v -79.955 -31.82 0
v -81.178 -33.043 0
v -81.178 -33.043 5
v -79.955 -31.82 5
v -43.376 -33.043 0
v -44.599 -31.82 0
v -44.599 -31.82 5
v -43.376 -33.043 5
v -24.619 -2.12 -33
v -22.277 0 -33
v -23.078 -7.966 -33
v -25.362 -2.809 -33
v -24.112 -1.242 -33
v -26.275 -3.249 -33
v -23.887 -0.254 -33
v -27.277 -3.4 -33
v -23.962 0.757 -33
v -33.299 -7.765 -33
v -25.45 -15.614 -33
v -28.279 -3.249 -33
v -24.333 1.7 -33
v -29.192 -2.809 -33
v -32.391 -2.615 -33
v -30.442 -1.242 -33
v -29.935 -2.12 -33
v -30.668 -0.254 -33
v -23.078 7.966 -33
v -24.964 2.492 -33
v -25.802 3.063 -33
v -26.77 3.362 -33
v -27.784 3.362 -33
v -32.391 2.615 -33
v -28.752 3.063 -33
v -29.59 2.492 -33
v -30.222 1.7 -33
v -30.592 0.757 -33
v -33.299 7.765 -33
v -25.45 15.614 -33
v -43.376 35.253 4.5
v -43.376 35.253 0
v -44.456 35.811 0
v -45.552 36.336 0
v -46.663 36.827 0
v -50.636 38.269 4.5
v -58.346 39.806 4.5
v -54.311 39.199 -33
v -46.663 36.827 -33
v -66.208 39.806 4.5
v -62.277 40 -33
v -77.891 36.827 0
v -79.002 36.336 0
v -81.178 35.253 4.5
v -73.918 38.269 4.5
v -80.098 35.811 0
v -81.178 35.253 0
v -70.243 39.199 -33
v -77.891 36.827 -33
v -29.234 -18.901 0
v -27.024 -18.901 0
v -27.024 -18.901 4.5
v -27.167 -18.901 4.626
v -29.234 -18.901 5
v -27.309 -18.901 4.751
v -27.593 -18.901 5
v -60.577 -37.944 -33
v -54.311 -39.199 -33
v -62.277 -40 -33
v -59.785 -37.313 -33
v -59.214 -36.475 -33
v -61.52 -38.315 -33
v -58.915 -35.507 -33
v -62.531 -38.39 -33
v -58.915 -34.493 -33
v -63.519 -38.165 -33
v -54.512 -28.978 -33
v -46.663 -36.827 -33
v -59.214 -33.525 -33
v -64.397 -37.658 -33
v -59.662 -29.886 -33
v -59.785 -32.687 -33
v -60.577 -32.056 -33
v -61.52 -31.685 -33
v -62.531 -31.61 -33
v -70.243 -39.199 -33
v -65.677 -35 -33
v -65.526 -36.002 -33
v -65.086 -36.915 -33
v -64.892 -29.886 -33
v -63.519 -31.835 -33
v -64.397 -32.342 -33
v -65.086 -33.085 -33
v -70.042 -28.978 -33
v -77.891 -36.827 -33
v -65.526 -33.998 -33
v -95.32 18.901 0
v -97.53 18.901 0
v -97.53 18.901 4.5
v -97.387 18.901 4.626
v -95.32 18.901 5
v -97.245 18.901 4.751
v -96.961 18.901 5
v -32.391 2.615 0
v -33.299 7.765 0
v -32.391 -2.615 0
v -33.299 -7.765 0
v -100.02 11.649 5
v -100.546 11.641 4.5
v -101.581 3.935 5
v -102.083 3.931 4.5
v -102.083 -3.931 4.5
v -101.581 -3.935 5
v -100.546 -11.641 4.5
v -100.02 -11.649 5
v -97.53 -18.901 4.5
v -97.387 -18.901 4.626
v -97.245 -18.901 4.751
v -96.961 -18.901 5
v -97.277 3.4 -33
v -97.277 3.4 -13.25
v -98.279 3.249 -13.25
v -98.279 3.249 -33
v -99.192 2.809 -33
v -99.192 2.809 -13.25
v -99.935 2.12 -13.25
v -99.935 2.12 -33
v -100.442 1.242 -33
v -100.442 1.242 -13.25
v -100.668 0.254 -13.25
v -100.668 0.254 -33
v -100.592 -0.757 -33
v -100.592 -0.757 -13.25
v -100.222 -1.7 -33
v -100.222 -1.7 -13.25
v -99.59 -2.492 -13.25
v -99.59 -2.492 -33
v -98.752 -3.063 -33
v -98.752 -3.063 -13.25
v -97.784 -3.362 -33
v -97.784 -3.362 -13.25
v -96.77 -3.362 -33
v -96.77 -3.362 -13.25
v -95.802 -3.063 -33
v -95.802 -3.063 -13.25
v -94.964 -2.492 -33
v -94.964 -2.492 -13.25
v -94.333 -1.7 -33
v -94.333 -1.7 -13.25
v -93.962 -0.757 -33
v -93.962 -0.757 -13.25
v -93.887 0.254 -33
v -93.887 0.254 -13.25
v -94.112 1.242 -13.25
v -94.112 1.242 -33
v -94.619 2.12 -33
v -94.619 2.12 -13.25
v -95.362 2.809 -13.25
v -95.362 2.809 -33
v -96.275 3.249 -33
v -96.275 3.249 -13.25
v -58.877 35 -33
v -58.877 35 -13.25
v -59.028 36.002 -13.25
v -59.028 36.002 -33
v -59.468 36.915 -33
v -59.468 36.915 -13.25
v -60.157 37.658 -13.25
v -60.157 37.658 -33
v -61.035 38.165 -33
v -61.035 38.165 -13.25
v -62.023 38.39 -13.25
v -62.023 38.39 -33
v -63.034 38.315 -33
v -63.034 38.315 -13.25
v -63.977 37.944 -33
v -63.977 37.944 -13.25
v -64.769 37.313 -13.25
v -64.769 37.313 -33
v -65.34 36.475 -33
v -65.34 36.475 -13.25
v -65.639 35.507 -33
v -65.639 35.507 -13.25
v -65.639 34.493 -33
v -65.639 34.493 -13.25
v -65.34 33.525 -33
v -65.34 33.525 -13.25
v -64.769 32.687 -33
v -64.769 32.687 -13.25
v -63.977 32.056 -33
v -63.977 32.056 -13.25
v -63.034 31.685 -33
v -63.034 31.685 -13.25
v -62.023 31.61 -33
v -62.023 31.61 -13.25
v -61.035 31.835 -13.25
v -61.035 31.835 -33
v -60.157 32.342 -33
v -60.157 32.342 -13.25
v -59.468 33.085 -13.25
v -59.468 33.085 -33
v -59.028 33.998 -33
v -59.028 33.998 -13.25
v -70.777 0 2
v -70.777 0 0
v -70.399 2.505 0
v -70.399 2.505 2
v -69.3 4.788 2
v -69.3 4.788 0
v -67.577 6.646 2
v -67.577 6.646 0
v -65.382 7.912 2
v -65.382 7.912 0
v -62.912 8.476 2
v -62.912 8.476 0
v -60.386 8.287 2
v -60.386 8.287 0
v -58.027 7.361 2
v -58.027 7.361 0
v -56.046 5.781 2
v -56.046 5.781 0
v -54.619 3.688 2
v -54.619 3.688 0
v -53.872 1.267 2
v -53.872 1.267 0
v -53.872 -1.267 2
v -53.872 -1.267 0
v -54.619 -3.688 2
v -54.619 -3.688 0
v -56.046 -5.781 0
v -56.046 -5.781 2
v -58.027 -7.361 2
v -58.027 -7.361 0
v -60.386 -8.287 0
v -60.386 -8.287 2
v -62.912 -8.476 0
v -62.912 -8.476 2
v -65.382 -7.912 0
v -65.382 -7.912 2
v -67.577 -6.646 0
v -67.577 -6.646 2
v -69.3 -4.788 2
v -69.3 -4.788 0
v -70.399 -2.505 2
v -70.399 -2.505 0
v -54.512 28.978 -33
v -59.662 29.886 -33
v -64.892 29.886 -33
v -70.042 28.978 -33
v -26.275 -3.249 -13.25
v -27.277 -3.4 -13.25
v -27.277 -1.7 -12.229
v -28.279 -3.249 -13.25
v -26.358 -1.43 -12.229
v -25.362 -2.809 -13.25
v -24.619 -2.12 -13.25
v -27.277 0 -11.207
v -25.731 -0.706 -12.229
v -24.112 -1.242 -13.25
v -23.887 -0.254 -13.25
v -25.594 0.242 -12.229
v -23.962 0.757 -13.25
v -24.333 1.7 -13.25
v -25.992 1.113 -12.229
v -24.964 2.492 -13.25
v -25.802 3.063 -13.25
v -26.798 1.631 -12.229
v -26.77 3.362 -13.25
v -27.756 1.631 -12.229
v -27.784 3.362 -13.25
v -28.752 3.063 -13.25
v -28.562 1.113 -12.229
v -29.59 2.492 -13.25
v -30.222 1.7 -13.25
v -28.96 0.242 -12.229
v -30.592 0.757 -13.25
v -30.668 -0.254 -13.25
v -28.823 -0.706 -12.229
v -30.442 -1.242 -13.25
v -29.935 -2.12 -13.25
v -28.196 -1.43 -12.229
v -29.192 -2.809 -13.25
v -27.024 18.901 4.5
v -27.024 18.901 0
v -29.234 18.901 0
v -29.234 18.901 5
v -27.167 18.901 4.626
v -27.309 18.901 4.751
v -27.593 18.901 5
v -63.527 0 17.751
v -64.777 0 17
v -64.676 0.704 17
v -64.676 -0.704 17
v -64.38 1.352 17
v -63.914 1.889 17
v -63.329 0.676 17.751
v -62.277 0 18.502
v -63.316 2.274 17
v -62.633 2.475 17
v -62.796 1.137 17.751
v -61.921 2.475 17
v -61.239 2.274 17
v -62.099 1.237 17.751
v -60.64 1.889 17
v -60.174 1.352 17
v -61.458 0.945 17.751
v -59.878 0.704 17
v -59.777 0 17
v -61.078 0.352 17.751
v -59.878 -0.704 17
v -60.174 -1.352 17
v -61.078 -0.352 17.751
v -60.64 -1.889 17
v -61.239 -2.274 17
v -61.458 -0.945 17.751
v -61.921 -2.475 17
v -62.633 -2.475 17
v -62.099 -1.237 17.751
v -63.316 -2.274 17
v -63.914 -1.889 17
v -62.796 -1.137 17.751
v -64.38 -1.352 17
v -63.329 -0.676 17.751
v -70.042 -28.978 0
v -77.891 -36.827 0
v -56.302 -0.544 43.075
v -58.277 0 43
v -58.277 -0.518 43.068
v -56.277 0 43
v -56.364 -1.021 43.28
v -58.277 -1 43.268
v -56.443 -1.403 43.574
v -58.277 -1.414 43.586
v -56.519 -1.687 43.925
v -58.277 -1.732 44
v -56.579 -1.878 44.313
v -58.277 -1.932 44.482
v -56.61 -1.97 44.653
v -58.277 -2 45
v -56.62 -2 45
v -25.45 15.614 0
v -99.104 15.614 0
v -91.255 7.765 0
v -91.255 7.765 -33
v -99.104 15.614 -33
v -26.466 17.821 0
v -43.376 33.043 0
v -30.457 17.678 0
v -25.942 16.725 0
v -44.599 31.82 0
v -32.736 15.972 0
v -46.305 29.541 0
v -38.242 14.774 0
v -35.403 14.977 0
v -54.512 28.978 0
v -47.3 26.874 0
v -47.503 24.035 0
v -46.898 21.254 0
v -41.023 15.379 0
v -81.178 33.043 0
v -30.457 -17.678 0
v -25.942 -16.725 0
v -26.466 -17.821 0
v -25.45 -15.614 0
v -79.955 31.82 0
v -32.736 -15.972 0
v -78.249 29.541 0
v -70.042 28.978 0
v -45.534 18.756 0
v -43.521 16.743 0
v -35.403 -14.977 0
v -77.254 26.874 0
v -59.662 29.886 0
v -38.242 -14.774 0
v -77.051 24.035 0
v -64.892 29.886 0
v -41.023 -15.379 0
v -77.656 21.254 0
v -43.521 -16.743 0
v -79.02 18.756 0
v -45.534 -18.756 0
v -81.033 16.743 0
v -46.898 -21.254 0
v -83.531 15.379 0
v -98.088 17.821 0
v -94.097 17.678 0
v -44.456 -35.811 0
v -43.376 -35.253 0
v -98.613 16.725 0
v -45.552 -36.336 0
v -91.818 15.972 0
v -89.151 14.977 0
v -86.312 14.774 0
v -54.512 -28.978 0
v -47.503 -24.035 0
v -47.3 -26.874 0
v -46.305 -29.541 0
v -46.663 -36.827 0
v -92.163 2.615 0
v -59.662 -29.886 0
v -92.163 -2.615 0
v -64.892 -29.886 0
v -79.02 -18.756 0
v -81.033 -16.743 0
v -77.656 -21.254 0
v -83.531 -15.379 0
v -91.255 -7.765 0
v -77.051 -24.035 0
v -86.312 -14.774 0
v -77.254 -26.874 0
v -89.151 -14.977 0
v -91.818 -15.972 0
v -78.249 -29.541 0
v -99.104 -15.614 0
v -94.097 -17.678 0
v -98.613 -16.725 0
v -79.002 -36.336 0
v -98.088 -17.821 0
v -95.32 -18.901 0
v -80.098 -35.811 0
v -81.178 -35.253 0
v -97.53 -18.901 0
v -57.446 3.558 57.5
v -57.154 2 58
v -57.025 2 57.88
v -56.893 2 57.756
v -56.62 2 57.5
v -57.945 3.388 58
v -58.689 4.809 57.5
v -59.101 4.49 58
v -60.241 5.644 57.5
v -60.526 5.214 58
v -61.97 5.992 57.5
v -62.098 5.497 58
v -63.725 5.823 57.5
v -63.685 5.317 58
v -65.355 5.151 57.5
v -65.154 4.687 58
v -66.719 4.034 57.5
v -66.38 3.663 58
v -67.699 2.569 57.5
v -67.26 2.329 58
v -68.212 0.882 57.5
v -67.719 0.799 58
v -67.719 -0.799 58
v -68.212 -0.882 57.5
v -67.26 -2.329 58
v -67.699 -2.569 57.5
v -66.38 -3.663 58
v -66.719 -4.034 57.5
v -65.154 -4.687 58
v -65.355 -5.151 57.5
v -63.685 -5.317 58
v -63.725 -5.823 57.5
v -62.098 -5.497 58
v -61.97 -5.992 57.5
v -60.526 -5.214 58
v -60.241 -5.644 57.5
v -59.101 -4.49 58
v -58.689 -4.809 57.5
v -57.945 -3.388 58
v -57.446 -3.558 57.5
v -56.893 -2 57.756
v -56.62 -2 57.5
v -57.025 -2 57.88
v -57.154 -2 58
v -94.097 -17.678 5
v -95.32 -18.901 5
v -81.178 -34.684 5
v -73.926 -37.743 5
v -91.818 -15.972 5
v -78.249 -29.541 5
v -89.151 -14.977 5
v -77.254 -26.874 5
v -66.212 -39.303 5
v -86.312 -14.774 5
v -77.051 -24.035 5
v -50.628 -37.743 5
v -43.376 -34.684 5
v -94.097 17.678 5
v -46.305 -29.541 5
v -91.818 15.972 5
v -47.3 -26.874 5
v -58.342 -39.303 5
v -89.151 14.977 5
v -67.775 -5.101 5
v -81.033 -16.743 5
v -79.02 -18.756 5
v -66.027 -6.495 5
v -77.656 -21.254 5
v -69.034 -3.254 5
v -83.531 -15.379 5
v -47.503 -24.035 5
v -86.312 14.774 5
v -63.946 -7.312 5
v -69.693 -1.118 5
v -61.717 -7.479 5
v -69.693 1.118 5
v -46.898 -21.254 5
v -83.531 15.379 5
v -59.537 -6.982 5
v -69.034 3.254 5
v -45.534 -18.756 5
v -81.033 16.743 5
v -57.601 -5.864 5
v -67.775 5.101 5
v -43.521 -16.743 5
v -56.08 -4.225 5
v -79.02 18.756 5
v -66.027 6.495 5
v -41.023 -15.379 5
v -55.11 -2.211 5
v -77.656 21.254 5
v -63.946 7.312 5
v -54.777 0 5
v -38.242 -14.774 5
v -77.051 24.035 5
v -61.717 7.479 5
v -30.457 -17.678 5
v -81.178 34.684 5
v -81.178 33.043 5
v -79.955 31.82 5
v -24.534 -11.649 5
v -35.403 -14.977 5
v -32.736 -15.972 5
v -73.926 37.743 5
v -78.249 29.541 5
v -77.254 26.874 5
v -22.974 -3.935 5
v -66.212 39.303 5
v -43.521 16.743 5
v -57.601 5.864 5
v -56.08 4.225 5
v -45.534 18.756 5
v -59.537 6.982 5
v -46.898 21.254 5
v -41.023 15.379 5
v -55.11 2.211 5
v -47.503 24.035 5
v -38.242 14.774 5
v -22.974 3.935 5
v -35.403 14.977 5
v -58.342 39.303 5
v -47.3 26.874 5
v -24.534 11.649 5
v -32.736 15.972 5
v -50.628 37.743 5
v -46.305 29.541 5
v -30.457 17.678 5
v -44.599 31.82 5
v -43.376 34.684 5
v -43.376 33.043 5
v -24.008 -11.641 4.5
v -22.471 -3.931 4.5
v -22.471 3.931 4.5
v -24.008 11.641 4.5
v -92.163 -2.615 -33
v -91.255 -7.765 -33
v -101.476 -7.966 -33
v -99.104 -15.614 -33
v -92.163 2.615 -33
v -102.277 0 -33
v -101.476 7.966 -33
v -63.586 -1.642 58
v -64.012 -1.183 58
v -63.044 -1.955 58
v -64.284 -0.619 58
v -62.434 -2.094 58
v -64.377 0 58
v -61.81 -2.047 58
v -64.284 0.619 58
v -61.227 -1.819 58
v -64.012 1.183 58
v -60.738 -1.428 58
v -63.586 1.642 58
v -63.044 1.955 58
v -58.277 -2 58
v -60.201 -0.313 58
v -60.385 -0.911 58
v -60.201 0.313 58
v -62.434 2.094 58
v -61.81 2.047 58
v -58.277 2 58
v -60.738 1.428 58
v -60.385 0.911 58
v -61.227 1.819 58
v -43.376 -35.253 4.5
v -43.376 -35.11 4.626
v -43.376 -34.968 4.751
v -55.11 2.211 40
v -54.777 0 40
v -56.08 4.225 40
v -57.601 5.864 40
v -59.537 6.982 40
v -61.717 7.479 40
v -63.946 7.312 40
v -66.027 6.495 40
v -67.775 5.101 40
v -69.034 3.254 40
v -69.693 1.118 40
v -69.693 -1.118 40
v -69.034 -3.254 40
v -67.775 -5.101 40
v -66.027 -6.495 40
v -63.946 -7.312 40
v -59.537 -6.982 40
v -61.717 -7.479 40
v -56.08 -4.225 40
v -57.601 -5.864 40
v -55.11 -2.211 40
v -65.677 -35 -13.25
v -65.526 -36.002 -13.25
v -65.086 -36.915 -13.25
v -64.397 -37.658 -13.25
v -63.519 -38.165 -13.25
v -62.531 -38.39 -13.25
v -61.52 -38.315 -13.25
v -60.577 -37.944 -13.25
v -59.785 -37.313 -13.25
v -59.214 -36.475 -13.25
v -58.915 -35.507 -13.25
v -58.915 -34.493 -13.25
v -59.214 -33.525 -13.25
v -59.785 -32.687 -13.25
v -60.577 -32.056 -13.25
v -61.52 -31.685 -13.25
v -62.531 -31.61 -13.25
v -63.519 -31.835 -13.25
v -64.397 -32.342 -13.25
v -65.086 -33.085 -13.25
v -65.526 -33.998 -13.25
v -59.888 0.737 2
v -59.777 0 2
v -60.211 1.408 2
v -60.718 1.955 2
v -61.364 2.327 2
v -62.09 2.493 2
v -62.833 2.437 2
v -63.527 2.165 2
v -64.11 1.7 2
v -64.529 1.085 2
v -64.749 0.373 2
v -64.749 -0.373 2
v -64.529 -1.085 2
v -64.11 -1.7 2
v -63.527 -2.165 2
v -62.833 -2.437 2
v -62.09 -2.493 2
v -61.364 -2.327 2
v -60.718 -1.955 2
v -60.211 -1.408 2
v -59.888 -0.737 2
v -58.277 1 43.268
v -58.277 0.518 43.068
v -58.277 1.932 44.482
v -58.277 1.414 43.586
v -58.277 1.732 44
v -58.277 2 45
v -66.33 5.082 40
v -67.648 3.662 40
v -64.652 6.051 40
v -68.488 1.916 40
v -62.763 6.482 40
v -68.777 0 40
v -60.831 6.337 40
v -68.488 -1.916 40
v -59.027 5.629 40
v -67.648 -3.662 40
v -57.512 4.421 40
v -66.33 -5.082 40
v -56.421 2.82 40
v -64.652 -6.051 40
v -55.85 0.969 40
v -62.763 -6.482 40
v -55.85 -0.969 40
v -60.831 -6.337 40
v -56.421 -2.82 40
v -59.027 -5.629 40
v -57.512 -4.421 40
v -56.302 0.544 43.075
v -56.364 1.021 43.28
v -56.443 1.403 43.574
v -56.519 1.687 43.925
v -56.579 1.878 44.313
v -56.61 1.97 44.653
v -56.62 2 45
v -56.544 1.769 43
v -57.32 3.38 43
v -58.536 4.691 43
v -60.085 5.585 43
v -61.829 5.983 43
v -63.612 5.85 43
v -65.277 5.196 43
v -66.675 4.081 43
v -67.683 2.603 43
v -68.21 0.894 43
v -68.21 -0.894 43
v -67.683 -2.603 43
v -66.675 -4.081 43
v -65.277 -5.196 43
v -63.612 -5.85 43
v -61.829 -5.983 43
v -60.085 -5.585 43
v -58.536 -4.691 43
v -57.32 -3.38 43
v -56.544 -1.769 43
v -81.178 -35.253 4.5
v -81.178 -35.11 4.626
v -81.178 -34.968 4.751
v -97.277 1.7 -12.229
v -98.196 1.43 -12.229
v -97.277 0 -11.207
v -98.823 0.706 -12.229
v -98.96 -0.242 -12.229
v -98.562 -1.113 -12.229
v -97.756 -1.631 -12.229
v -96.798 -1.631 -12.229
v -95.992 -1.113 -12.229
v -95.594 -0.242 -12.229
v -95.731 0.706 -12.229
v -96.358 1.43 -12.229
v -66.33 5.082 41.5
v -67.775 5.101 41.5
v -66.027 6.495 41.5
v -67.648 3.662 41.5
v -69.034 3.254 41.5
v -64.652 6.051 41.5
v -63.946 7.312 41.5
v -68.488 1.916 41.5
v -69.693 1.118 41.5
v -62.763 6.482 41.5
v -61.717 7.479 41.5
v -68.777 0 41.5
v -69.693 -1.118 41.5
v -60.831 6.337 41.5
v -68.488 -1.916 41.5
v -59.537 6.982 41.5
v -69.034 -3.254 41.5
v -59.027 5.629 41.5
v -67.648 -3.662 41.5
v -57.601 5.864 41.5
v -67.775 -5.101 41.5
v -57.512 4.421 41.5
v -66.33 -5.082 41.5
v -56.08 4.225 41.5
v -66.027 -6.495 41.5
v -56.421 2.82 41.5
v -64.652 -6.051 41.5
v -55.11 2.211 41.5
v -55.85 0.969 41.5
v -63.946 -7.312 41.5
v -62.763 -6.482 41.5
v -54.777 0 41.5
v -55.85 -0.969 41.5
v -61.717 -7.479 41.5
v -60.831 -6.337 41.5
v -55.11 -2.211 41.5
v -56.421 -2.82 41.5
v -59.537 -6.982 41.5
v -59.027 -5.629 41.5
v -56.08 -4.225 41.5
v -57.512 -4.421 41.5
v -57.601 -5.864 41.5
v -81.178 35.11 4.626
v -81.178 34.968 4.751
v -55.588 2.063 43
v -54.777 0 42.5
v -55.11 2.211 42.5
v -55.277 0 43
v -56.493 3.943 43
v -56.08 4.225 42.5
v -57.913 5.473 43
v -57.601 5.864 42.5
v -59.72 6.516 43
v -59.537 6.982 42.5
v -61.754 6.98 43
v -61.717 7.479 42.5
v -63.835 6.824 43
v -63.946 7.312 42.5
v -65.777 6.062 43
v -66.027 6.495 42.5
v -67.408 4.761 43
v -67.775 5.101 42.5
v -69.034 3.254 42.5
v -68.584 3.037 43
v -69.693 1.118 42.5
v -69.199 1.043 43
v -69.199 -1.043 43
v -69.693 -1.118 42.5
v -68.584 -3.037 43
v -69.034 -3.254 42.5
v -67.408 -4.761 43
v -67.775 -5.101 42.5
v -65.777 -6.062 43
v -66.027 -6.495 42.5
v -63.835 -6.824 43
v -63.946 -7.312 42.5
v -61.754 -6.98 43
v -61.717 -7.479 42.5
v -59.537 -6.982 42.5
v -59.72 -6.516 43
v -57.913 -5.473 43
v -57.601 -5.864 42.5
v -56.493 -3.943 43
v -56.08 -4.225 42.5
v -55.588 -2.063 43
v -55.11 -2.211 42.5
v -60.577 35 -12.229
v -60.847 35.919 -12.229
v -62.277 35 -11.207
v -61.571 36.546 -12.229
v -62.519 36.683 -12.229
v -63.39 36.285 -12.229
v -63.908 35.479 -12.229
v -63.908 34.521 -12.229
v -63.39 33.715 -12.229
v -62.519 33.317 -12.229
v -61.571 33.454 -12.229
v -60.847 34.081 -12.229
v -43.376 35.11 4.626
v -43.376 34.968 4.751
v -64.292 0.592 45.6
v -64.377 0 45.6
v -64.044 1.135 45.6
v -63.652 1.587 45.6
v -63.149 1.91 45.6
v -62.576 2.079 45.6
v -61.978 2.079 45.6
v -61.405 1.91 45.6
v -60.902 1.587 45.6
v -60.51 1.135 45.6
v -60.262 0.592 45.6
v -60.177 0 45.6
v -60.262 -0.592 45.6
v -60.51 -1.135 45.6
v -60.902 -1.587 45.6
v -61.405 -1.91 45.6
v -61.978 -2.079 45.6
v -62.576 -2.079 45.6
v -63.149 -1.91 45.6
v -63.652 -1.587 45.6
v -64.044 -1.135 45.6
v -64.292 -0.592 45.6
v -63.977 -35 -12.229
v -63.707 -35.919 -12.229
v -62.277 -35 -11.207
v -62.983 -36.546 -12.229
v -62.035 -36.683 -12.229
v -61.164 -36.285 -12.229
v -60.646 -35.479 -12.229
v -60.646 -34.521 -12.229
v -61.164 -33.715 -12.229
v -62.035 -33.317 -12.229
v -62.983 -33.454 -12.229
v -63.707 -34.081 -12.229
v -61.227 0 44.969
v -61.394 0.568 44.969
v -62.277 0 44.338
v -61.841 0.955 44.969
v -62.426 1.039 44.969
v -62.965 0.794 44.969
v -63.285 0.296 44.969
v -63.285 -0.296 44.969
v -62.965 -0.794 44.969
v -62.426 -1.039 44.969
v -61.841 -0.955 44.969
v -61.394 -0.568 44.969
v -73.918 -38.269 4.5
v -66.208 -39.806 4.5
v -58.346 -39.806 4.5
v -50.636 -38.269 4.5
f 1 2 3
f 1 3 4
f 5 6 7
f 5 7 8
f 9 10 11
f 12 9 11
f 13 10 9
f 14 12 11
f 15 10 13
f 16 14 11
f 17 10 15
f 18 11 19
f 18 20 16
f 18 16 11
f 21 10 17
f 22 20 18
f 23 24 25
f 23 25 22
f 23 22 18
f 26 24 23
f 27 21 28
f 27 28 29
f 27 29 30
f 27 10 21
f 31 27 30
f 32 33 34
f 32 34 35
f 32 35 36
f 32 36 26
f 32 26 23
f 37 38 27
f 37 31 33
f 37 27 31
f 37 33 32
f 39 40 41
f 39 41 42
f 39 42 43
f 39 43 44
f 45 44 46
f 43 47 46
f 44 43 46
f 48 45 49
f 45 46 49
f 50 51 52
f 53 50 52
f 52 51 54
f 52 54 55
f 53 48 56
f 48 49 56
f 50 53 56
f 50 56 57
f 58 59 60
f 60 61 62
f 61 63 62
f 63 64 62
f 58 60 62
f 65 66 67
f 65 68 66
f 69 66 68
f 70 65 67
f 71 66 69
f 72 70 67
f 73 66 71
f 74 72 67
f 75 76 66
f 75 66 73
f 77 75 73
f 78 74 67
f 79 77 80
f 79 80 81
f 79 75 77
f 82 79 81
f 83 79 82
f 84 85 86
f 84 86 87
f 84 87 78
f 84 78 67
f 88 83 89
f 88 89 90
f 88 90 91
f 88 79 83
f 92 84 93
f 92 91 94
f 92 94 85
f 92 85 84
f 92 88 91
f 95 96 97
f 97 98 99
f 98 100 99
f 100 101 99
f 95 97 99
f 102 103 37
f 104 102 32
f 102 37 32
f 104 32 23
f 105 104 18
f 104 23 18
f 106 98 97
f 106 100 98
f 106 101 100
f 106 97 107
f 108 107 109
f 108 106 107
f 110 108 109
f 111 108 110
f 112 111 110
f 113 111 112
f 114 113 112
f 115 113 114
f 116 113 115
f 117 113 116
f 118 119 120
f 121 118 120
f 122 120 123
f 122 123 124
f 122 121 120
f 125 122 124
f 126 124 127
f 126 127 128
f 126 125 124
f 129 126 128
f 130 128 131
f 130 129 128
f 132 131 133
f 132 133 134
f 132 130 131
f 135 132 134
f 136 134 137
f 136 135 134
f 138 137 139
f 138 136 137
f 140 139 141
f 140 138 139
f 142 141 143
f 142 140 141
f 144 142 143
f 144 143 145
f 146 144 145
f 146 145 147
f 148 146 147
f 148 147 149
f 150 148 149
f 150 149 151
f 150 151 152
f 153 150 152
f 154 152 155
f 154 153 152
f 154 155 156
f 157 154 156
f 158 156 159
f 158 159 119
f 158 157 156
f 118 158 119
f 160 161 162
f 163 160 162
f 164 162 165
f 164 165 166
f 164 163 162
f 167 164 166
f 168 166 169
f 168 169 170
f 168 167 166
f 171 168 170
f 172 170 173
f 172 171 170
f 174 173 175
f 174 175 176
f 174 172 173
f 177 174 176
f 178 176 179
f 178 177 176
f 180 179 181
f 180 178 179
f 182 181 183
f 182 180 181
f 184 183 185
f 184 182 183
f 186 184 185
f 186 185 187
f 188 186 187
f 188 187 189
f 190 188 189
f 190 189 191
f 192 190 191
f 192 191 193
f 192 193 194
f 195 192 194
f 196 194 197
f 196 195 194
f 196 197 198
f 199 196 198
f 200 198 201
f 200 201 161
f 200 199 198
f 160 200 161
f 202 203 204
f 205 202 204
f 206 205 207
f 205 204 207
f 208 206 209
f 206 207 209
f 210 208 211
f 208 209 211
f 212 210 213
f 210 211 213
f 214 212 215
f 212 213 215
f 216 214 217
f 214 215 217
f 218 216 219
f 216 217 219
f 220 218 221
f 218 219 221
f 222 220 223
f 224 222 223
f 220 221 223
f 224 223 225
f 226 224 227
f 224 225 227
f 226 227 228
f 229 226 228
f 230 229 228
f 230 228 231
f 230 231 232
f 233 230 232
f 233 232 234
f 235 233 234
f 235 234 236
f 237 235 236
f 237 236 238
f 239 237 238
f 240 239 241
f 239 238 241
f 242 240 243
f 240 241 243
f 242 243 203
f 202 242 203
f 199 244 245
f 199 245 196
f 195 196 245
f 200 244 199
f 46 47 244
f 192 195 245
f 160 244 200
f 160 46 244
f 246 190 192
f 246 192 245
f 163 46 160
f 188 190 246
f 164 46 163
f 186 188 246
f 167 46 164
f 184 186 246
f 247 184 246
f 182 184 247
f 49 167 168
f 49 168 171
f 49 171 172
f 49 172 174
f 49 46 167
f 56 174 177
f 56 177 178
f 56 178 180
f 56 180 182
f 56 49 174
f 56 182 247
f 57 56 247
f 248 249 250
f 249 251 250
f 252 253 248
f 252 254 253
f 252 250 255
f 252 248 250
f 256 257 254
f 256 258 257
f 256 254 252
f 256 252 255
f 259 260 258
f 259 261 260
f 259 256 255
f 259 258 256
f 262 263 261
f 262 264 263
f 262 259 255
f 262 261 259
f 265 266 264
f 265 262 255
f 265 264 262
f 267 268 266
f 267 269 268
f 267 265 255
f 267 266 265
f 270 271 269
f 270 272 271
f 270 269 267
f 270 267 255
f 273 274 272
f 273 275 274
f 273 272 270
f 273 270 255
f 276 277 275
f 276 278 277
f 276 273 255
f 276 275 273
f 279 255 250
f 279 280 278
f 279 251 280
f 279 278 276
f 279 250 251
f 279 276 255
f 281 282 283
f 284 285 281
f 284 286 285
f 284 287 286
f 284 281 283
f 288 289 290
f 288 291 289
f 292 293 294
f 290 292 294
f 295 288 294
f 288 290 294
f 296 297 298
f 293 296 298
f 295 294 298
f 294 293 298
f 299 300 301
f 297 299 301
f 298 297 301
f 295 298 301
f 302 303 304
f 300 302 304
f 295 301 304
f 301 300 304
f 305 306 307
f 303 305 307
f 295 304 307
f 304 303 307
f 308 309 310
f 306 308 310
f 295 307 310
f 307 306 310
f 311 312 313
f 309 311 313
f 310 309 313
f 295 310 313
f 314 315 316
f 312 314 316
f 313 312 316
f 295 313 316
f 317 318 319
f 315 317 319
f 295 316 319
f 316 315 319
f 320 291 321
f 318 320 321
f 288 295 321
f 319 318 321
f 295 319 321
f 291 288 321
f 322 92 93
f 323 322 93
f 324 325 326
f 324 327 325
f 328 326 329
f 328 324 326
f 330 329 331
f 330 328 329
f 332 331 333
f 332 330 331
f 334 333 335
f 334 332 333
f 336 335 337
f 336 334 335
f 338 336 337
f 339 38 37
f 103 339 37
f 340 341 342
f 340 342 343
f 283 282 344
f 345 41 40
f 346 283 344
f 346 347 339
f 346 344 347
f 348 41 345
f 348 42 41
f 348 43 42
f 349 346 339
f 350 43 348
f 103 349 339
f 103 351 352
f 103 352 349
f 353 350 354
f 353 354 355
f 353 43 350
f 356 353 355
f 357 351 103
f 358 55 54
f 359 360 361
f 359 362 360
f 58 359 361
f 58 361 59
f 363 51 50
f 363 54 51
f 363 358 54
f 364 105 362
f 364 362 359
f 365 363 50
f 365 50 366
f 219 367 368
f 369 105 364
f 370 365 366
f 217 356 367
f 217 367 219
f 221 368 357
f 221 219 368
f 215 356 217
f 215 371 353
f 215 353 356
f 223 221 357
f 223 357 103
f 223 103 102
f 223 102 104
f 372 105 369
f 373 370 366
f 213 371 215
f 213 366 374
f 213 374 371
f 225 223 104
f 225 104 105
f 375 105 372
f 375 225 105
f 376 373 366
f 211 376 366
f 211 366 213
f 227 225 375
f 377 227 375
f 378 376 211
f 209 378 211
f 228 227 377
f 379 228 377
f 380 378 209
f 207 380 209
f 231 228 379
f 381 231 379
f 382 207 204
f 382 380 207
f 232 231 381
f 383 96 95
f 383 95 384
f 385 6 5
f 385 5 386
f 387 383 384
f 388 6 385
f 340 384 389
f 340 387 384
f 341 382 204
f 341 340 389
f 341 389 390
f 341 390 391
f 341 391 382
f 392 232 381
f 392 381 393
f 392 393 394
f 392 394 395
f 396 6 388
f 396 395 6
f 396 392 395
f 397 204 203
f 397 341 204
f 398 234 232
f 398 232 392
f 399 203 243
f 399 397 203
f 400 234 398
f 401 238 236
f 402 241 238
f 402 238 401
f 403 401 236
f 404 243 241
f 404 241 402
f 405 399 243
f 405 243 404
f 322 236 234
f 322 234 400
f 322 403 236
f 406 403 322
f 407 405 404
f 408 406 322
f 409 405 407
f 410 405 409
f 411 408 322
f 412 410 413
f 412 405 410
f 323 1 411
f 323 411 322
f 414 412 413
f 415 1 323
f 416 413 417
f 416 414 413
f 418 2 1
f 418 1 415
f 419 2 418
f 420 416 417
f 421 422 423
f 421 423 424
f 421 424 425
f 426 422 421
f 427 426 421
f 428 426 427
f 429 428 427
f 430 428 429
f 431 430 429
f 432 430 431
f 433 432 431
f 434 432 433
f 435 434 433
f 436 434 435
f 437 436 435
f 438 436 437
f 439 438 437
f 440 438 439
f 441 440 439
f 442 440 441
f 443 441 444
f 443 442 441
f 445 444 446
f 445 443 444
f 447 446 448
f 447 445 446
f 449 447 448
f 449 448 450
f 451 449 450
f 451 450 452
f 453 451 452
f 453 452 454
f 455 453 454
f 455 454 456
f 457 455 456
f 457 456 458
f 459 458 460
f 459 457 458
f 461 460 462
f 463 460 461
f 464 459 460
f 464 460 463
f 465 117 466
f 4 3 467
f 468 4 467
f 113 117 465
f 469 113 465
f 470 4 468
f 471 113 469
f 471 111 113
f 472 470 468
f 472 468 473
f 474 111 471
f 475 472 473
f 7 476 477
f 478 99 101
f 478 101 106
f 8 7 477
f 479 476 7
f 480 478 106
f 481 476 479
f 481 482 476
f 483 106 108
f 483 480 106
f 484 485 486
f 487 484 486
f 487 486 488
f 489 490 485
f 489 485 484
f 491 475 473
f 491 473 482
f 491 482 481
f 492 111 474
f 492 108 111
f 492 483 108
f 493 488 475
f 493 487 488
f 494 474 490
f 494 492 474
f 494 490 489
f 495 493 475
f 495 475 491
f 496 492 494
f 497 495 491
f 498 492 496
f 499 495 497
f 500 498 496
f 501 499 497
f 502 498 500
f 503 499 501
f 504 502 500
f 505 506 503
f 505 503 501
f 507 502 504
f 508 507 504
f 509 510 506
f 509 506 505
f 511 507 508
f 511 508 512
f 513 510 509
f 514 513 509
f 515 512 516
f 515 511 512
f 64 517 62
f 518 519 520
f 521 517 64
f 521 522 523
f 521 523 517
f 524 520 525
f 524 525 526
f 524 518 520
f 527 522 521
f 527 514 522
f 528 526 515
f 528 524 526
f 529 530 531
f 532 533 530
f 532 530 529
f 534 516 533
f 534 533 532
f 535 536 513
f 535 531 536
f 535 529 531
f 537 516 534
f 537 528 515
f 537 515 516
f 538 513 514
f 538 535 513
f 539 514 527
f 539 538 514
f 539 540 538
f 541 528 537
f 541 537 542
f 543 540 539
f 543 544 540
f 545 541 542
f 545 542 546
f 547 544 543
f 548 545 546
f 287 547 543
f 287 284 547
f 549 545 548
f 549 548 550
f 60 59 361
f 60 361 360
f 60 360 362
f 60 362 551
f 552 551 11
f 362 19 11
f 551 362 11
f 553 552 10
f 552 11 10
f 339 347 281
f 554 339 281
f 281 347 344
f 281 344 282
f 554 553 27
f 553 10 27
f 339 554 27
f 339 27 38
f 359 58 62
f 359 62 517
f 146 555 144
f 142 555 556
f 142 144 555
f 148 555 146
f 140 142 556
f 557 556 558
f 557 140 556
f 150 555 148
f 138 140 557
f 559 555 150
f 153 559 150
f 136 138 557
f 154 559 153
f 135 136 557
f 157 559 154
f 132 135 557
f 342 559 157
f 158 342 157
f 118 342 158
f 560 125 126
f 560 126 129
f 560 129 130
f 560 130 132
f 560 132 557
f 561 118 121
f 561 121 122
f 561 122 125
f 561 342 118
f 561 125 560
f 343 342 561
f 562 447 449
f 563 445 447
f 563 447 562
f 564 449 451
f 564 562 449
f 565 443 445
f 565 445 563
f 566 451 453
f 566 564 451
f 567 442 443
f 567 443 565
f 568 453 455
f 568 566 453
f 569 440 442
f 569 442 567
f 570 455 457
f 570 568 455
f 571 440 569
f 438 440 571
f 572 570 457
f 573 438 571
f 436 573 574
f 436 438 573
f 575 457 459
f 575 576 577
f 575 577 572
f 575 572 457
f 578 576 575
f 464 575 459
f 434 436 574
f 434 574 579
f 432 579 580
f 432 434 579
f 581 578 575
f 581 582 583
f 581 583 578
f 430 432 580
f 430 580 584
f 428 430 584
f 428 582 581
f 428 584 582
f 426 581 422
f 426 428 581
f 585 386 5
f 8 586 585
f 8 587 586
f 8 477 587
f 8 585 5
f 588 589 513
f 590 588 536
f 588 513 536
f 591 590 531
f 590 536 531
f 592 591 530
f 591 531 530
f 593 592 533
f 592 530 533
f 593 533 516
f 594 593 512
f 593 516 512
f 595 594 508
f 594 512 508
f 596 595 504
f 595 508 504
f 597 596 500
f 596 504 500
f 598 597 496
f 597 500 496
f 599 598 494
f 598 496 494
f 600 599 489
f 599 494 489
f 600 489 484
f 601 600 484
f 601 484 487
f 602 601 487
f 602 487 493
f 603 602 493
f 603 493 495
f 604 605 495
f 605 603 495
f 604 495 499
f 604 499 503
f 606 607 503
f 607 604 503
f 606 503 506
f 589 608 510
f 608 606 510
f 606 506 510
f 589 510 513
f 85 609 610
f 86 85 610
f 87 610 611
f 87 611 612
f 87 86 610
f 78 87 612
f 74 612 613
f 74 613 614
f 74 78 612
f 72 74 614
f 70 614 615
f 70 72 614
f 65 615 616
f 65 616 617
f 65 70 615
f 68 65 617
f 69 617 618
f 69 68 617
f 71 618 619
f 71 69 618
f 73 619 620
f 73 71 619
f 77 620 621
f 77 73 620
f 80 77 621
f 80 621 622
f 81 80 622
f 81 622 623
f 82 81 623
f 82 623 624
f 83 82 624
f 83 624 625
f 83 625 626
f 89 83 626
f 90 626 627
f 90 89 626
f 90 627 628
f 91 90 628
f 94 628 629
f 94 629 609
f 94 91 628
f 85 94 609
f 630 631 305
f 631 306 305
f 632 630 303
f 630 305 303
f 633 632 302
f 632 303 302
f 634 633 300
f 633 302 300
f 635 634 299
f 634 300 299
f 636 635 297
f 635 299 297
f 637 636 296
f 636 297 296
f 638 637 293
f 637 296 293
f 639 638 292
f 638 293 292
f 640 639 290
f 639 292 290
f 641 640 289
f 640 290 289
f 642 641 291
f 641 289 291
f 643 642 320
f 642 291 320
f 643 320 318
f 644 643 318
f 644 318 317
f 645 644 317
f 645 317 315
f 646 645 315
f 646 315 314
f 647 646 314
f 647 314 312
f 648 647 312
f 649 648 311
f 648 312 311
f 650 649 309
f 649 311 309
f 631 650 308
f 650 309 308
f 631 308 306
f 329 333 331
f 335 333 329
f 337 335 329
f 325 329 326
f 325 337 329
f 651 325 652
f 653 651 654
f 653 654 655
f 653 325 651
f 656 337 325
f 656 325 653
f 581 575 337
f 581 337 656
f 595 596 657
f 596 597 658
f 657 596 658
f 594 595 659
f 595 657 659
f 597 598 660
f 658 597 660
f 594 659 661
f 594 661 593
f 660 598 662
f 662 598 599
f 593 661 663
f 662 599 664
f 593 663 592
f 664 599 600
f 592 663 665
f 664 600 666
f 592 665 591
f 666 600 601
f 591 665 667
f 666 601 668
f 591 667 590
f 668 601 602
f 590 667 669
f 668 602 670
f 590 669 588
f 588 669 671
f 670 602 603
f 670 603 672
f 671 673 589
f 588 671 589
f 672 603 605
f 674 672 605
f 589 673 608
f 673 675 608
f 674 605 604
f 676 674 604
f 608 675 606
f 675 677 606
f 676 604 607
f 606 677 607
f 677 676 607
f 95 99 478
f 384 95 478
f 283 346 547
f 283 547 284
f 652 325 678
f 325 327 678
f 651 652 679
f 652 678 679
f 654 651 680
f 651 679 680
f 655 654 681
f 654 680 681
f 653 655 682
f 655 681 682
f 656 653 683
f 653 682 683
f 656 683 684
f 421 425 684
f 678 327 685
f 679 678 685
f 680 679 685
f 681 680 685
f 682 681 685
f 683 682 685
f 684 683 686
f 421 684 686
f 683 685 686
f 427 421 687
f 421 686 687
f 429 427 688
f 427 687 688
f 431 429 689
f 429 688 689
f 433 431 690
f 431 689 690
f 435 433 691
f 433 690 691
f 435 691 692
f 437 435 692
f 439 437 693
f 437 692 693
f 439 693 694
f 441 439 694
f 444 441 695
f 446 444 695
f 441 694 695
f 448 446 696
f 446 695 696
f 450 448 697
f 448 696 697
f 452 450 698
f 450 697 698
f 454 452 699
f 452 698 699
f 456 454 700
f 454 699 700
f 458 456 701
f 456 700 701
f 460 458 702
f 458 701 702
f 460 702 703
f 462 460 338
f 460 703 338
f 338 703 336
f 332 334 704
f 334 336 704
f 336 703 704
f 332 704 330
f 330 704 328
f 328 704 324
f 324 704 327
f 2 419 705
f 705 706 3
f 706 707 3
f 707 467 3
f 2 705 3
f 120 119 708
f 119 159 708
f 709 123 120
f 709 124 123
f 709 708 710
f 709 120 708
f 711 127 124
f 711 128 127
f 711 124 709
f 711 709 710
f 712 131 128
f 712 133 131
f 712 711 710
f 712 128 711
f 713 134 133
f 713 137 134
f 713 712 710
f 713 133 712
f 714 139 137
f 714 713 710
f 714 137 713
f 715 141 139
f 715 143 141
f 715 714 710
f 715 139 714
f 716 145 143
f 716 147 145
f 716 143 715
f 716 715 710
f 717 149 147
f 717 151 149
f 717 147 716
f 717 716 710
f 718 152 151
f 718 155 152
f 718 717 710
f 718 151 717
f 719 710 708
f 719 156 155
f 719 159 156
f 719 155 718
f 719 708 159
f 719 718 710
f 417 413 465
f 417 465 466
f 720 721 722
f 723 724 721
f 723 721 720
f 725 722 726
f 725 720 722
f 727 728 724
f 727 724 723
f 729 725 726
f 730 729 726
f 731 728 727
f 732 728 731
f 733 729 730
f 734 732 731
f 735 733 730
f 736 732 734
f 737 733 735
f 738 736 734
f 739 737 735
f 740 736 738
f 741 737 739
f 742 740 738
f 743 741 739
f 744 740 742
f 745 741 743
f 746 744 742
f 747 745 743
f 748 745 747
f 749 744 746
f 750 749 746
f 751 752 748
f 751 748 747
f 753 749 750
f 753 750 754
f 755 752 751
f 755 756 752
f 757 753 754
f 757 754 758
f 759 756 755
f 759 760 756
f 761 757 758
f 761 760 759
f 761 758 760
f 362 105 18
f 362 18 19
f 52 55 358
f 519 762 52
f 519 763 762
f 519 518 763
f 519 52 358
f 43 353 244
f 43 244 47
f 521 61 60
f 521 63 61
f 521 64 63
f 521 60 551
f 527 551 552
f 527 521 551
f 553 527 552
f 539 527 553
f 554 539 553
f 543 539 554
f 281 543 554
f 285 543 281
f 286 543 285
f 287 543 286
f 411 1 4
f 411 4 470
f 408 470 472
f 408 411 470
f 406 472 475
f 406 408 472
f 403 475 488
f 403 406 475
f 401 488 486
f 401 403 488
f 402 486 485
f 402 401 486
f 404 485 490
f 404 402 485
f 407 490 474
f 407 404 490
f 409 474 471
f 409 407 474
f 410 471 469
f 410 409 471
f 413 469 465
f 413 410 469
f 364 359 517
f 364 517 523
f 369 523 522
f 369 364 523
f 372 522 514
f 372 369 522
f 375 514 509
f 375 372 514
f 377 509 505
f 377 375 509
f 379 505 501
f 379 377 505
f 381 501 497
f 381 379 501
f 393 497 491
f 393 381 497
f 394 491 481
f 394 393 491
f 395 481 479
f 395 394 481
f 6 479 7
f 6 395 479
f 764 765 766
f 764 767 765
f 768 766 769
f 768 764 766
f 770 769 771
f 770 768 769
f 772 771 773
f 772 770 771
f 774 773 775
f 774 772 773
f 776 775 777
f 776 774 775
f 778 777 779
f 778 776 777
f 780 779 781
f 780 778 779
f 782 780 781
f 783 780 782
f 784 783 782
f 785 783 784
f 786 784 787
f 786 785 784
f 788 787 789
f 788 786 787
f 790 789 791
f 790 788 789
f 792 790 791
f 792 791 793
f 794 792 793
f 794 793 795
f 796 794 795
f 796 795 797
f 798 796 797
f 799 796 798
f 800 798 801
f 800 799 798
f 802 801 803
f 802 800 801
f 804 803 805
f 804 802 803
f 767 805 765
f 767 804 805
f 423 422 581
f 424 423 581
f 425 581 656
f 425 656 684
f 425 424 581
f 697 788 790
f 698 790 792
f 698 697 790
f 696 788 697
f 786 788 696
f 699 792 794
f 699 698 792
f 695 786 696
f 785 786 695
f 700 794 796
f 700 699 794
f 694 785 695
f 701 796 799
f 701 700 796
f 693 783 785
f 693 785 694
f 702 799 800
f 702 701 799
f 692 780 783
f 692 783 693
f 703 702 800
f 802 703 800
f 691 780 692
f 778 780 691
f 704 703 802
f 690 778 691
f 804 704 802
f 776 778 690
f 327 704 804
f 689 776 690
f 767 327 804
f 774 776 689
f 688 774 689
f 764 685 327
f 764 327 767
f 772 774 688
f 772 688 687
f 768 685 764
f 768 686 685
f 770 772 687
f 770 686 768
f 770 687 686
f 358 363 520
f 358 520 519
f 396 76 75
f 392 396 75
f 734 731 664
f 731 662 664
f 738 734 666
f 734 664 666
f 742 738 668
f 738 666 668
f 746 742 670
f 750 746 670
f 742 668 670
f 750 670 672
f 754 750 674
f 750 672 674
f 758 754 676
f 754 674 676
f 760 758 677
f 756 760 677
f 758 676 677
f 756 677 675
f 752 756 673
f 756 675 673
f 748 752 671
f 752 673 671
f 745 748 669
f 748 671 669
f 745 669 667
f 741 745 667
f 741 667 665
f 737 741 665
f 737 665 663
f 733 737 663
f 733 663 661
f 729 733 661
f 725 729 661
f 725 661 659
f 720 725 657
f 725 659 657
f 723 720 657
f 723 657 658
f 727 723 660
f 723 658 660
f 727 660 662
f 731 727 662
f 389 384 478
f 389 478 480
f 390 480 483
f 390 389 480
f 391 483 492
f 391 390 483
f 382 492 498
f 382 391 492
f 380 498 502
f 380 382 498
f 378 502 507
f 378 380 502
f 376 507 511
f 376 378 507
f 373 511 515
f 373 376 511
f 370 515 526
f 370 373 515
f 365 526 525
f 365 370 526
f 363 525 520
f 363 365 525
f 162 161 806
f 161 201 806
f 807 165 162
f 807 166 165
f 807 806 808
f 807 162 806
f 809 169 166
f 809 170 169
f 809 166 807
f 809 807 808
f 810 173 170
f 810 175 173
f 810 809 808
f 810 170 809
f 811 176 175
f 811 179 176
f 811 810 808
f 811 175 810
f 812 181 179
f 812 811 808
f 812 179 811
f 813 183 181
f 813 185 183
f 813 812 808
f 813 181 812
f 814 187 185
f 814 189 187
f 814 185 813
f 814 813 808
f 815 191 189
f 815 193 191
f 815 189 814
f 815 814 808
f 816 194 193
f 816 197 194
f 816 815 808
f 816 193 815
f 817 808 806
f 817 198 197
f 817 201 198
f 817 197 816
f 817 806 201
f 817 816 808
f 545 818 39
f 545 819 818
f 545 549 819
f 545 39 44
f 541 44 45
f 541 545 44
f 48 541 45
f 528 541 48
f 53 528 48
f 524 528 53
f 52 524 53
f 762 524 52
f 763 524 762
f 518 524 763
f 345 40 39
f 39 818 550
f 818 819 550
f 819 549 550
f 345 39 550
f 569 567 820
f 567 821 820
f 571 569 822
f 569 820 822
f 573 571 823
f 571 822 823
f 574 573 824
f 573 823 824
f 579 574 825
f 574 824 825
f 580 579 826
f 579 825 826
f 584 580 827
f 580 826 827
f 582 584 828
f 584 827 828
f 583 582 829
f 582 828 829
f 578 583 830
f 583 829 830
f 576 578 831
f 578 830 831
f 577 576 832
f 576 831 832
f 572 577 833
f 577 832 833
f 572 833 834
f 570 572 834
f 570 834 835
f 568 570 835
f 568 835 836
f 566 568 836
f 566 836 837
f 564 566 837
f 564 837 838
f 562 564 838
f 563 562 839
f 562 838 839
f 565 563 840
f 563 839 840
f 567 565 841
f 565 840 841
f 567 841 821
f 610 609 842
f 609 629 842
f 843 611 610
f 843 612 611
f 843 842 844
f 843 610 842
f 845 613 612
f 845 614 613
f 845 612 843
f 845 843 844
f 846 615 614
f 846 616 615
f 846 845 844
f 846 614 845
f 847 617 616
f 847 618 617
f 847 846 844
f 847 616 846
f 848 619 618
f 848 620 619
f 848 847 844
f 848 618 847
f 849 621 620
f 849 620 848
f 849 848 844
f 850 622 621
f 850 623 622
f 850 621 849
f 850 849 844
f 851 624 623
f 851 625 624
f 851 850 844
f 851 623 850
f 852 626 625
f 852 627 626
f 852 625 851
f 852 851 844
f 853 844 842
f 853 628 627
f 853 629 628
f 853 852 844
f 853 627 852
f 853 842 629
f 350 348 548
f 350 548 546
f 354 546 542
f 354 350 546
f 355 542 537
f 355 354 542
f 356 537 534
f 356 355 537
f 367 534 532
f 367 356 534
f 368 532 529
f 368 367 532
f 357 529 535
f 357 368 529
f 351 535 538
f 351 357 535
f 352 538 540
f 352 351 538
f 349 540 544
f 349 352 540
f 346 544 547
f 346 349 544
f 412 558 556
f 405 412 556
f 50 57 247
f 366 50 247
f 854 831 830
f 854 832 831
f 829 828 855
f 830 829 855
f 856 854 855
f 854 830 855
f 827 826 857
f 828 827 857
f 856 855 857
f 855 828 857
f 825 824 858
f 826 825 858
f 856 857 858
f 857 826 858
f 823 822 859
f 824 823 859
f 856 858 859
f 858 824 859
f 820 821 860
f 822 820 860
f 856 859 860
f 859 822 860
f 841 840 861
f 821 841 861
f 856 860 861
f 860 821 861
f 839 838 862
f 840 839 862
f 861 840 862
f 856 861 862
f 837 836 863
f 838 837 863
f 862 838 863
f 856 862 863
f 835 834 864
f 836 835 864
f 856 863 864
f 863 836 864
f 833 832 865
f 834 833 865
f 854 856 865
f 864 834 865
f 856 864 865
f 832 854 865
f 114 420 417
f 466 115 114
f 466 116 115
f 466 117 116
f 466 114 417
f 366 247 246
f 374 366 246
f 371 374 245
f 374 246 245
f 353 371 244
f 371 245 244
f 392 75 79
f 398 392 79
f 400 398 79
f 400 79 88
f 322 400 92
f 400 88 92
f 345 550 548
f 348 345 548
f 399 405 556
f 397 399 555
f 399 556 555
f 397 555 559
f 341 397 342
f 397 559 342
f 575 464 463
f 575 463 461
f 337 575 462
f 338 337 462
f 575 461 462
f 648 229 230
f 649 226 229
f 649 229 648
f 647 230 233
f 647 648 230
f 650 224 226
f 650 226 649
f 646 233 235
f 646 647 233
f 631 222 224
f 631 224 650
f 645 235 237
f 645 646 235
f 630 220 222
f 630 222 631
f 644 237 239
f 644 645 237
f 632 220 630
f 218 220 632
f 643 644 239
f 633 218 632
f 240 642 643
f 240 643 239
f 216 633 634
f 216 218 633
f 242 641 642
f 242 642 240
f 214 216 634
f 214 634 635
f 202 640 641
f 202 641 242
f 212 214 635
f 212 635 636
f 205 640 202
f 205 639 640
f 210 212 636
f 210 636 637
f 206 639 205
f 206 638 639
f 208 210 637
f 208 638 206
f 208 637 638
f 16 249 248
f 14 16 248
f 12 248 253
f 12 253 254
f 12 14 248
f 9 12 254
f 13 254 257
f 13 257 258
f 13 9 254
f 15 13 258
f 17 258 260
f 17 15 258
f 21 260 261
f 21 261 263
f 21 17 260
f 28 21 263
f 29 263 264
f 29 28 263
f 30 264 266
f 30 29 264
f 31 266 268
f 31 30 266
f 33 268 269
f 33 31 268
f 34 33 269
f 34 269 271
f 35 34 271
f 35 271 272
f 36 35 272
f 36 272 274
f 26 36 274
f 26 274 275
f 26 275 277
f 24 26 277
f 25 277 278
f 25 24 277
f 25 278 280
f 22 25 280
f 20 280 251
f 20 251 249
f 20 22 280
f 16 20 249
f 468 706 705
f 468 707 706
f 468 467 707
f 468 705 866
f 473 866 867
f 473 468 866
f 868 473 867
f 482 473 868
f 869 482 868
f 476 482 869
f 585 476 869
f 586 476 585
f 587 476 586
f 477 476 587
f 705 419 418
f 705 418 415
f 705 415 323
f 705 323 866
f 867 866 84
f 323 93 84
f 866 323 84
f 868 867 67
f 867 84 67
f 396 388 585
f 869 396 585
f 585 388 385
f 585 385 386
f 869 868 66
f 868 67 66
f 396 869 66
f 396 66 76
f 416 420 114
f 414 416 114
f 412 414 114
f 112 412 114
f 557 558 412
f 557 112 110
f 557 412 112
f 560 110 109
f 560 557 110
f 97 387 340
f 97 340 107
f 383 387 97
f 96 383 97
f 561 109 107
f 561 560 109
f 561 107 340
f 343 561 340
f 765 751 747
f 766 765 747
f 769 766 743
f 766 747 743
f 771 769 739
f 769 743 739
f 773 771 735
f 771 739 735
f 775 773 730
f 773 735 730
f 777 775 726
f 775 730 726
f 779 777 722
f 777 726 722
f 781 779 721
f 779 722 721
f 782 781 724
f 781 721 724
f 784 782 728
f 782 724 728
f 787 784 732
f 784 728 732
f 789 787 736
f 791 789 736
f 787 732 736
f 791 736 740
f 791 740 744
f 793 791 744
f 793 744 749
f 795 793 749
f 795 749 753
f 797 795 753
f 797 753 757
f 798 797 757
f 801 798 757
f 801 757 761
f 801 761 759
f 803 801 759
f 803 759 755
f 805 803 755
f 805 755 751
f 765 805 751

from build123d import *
from build123d.topology import SkipClean

# Parameters (mm, degrees)
SKETCH_1_R               = 40
EXTRUDE_1_DEPTH          = 5
SKETCH_2_R               = 7.5
EXTRUDE_2_DEPTH          = 38
SKETCH_3_W               = 1.5
SKETCH_3_H               = 4.460741585
SKETCH_4_R               = 6
EXTRUDE_3_DEPTH          = 15
CHAMFER_1_SIZE           = 0.5
SKETCH_5_W               = 7.892485333
SKETCH_5_H               = 4
CUT_EXTRUDE_1_DEPTH      = 15
FILLET_1_R               = 2
EXTRUDE_START            = 33
SKETCH_6_R               = 40
SKETCH_6_R_2             = 30
EXTRUDE_4_DEPTH          = 33
PATTERN_CIRCULAR_1_COUNT = 4
CUT_EXTRUDE_2_DEPTH      = 33
PATTERN_CIRCULAR_2_COUNT = 2
PATTERN_CIRCULAR_2_ANGLE = 90
SKETCH_12_R              = 8.5
CUT_EXTRUDE_3_DEPTH      = 2
HOLE_WIZARD_M6_1_D       = 5
HOLE_WIZARD_M6_1_DEPTH   = 15
HOLE_WIZARD_M6_1_TIP     = 1.502151548
CUT_EXTRUDE_4_DEPTH      = 10
PATTERN_CIRCULAR_3_COUNT = 4
CHAMFER_2_SIZE           = 2
HOLE_WIZARD_M5_1_D       = 4.2
HOLE_WIZARD_M5_1_DEPTH   = 12.4
HOLE_WIZARD_M5_1_TIP     = 1.2618073


# Some blends are built 0.0001 mm under size
with BuildPart() as part:
    # 草图1 → 凸台-拉伸1 (new body)
    with BuildSketch(Plane.XY):
        with Locations((-62.277052722, 0)):
            Circle(SKETCH_1_R)
    extrude(amount=EXTRUDE_1_DEPTH)

    # 草图2 → 凸台-拉伸2 (add)
    with BuildSketch(Plane.XY.offset(5)):
        with Locations((-62.277052722, 0)):
            Circle(SKETCH_2_R)
    extrude(amount=EXTRUDE_2_DEPTH)

    # 草图3 → 切除-旋转1 (revolve, cut)
    with BuildSketch(Plane(origin=(0, 0, 0), x_dir=(0, 0, -1), z_dir=(0, -1, 0)), mode=Mode.PRIVATE) as cut_revolve_1_sk:
        with Locations((-40.75, -53.54668193)):
            Rectangle(SKETCH_3_W, SKETCH_3_H)
    revolve(cut_revolve_1_sk.sketch.rotate(Axis((-62.277052722, 0, 23.170133407), (0, 0, 1)), 180), axis=Axis((-62.277052722, 0, 23.170133407), (0, 0, 1)), mode=Mode.SUBTRACT)

    # 草图4 → 凸台-拉伸3 (add)
    with BuildSketch(Plane.XY.offset(43)):
        with Locations((-62.277052722, 0)):
            Circle(SKETCH_4_R)
    extrude(amount=EXTRUDE_3_DEPTH)

    # 倒角1
    chamfer_1_edges = [part.edges().sort_by_distance(p)[0] for p in [
        (-68.277052722, 0, 58),
        (-102.277052722, 0, 5),
        (-69.777052722, 0, 43),
    ]]
    chamfer(chamfer_1_edges, length=CHAMFER_1_SIZE)

    # 草图5 → 切除-拉伸1 (cut)
    with BuildSketch(Plane.XY.offset(58)):
        with Locations((-54.330810056, 0)):
            Rectangle(SKETCH_5_W, SKETCH_5_H)
    extrude(amount=-CUT_EXTRUDE_1_DEPTH, mode=Mode.SUBTRACT)

    # 圆角1
    fillet_1_edges = [part.edges().sort_by_distance(p)[0] for p in [
        (-57.448625597, -2, 43),
        (-57.448625597, 2, 43),
    ]]
    fillet(fillet_1_edges, radius=FILLET_1_R - 0.0001)  # a hair under: the kernel refuses the full size

    # 草图6 → 凸台-拉伸4 (add)
    with SkipClean():  # the faces are left unmerged after this step: merging them gives an invalid solid
        with BuildSketch(Plane(origin=(0, 0, 0), x_dir=(-1, 0, 0), z_dir=(0, 0, -1)).offset(EXTRUDE_START)):
            with Locations((62.277052722, 0)):
                Circle(SKETCH_6_R)
            with Locations((62.277052722, 0)):
                Circle(SKETCH_6_R_2, mode=Mode.SUBTRACT)
        extrude(amount=-EXTRUDE_4_DEPTH)

    # 草图9 → M8 螺纹孔1 (revolve, cut)
    with SkipClean():  # the faces are left unmerged after this step: merging them gives an invalid solid
        with BuildSketch(Plane(origin=(-97.277052722, 0, -33), x_dir=(0, 1, 0), z_dir=(1, 0, 0))):
            Polygon((0, 0), (0, 21.792926105), (3.4, 19.75), (3.4, 0), align=None)
        hole_wizard_m8_1 = revolve(axis=Axis((-97.277052722, 0, -39.35), (0, 0, 1)), mode=Mode.SUBTRACT)

    # 阵列(圆周)1: M8 螺纹孔1 ×4 about axis
    with SkipClean():  # the faces are left unmerged after this step: merging them gives an invalid solid
        pattern_circular_1_axis = Axis((-62.277052722, 0, 0), (0, 0, 1))
        for i in range(1, PATTERN_CIRCULAR_1_COUNT):
            add(hole_wizard_m8_1.rotate(pattern_circular_1_axis, i * 360 / PATTERN_CIRCULAR_1_COUNT), mode=Mode.SUBTRACT)

    # 草图11 → 切除-拉伸2 (cut)
    with SkipClean():  # the faces are left unmerged after this step: merging them gives an invalid solid
        with BuildSketch(Plane(origin=(0, 0, -33), x_dir=(-1, 0, 0), z_dir=(0, 0, -1))):
            Polygon((-32.267123115, 73.330972402), (135.608025124, -94.544175837), (156.82122856, -73.330972402), (-11.05391968, 94.544175837), align=None)
        cut_extrude_2 = extrude(amount=-CUT_EXTRUDE_2_DEPTH, mode=Mode.SUBTRACT)
    add(part.part.scale(1), mode=Mode.REPLACE)  # the faces are merged on a copy

    # 阵列(圆周)2: 切除-拉伸2 ×2 about axis
    pattern_circular_2_axis = Axis((-62.277052722, 0, -33), (0, 0, 1))
    for i in range(1, PATTERN_CIRCULAR_2_COUNT):
        add(cut_extrude_2.rotate(pattern_circular_2_axis, i * PATTERN_CIRCULAR_2_ANGLE / (PATTERN_CIRCULAR_2_COUNT - 1)), mode=Mode.SUBTRACT)

    # 草图12 → 切除-拉伸3 (cut)
    with BuildSketch(Plane(origin=(0, 0, 0), x_dir=(-1, 0, 0), z_dir=(0, 0, -1))):
        with Locations((62.277052722, 0)):
            Circle(SKETCH_12_R)
    extrude(amount=-CUT_EXTRUDE_3_DEPTH, mode=Mode.SUBTRACT)

    # M6 螺纹孔1
    with Locations(Plane(origin=(0, 0, 2), x_dir=(-1, 0, 0), z_dir=(0, 0, -1))):
        with Locations((62.277052722, 0)):
            Hole(HOLE_WIZARD_M6_1_D / 2, depth=HOLE_WIZARD_M6_1_DEPTH)
            with Locations((0, 0, -(HOLE_WIZARD_M6_1_DEPTH + HOLE_WIZARD_M6_1_TIP / 2))):  # 118° drill point
                Cone(0, HOLE_WIZARD_M6_1_D / 2, HOLE_WIZARD_M6_1_TIP, mode=Mode.SUBTRACT)

    # 草图15 → 切除-拉伸4 (cut)
    with BuildSketch(Plane(origin=(0, 0, 0), x_dir=(-1, 0, 0), z_dir=(0, 0, -1))):
        with BuildLine():
            Line((79.954722252, 31.819805153), (83.490256158, 35.355339059))
            ThreePointArc((83.490256158, 35.355339059), (97.632391781, 35.355339059), (97.632391781, 21.213203436))
            Line((97.632391781, 21.213203436), (94.096857875, 17.67766953))
            ThreePointArc((94.096857875, 17.67766953), (79.954722252, 17.67766953), (79.954722252, 31.819805153))
        make_face()
    cut_extrude_4 = extrude(amount=-CUT_EXTRUDE_4_DEPTH, mode=Mode.SUBTRACT)

    # 阵列(圆周)3: 切除-拉伸4 ×4 about axis
    pattern_circular_3_axis = Axis((-62.277052722, 0, 0), (0, 0, 1))
    for i in range(1, PATTERN_CIRCULAR_3_COUNT):
        add(cut_extrude_4.rotate(pattern_circular_3_axis, i * 360 / PATTERN_CIRCULAR_3_COUNT), mode=Mode.SUBTRACT)

    # 倒角2
    # the kernel refuses this chamfer: 2, 1.641704769 mm, written as the material it takes off along each edge
    with BuildSketch(Plane(origin=(-41.961992659, -34.457195687, 9.643365976), x_dir=(-0.8715539040567665, -0.4902996964341389, 0), z_dir=(0, 0, -1)), Plane(origin=(-27.819857035, 20.315060063, 9.643365976), x_dir=(0.49029969643413934, -0.8715539040567662, 0), z_dir=(0, 0, -1)), Plane(origin=(-82.592112785, 34.457195687, 9.643365976), x_dir=(0.8715539040567699, 0.4902996964341327, 0), z_dir=(0, 0, -1)), Plane(origin=(-96.734248409, -20.315060063, 9.643365976), x_dir=(-0.4902996964341341, 0.8715539040567691, 0), z_dir=(0, 0, -1))) as chamfer_2_piece_1:
        with BuildLine():
            Line((1.622634648, 0), (CHAMFER_2_SIZE * 0.269587435566, CHAMFER_2_SIZE * 0.96297591589))
            Line((CHAMFER_2_SIZE * 0.269587435566, CHAMFER_2_SIZE * 0.96297591589), (0, 0))
            ThreePointArc((0, 0), (0.83091626, -0.008223992), (1.622634648, 0))
        make_face()
    extrude(amount=14.786731952, mode=Mode.SUBTRACT)
    with BuildSketch(Plane(origin=(-27.819857035, -20.315060063, 9.643365976), x_dir=(0.49029969643413596, 0.871553904056768, 0), z_dir=(0, 0, -1)), Plane(origin=(-41.961992659, 34.457195687, 9.643365976), x_dir=(-0.8715539040567644, 0.4902996964341427, 0), z_dir=(0, 0, -1)), Plane(origin=(-96.734248409, 20.315060063, 9.643365976), x_dir=(-0.49029969643413984, -0.8715539040567659, 0), z_dir=(0, 0, -1)), Plane(origin=(-82.592112785, -34.457195687, 9.643365976), x_dir=(0.8715539040567665, -0.4902996964341389, 0), z_dir=(0, 0, -1))) as chamfer_2_piece_2:
        with BuildLine():
            Line((1.622634648, 0), (CHAMFER_2_SIZE * 0.269587435566, -CHAMFER_2_SIZE * 0.96297591589))
            Line((CHAMFER_2_SIZE * 0.269587435566, -CHAMFER_2_SIZE * 0.96297591589), (0, 0))
            ThreePointArc((0, 0), (0.83091626, 0.008223992), (1.622634648, 0))
        make_face()
    extrude(amount=14.786731952, mode=Mode.SUBTRACT)

    # M5 螺纹孔1
    with Locations(Plane.XY.offset(58)):
        with Locations((-62.277052722, 0)):
            Hole(HOLE_WIZARD_M5_1_D / 2, depth=HOLE_WIZARD_M5_1_DEPTH)
            with Locations((0, 0, -(HOLE_WIZARD_M5_1_DEPTH + HOLE_WIZARD_M5_1_TIP / 2))):  # 118° drill point
                Cone(0, HOLE_WIZARD_M5_1_D / 2, HOLE_WIZARD_M5_1_TIP, mode=Mode.SUBTRACT)


solid = part.part
